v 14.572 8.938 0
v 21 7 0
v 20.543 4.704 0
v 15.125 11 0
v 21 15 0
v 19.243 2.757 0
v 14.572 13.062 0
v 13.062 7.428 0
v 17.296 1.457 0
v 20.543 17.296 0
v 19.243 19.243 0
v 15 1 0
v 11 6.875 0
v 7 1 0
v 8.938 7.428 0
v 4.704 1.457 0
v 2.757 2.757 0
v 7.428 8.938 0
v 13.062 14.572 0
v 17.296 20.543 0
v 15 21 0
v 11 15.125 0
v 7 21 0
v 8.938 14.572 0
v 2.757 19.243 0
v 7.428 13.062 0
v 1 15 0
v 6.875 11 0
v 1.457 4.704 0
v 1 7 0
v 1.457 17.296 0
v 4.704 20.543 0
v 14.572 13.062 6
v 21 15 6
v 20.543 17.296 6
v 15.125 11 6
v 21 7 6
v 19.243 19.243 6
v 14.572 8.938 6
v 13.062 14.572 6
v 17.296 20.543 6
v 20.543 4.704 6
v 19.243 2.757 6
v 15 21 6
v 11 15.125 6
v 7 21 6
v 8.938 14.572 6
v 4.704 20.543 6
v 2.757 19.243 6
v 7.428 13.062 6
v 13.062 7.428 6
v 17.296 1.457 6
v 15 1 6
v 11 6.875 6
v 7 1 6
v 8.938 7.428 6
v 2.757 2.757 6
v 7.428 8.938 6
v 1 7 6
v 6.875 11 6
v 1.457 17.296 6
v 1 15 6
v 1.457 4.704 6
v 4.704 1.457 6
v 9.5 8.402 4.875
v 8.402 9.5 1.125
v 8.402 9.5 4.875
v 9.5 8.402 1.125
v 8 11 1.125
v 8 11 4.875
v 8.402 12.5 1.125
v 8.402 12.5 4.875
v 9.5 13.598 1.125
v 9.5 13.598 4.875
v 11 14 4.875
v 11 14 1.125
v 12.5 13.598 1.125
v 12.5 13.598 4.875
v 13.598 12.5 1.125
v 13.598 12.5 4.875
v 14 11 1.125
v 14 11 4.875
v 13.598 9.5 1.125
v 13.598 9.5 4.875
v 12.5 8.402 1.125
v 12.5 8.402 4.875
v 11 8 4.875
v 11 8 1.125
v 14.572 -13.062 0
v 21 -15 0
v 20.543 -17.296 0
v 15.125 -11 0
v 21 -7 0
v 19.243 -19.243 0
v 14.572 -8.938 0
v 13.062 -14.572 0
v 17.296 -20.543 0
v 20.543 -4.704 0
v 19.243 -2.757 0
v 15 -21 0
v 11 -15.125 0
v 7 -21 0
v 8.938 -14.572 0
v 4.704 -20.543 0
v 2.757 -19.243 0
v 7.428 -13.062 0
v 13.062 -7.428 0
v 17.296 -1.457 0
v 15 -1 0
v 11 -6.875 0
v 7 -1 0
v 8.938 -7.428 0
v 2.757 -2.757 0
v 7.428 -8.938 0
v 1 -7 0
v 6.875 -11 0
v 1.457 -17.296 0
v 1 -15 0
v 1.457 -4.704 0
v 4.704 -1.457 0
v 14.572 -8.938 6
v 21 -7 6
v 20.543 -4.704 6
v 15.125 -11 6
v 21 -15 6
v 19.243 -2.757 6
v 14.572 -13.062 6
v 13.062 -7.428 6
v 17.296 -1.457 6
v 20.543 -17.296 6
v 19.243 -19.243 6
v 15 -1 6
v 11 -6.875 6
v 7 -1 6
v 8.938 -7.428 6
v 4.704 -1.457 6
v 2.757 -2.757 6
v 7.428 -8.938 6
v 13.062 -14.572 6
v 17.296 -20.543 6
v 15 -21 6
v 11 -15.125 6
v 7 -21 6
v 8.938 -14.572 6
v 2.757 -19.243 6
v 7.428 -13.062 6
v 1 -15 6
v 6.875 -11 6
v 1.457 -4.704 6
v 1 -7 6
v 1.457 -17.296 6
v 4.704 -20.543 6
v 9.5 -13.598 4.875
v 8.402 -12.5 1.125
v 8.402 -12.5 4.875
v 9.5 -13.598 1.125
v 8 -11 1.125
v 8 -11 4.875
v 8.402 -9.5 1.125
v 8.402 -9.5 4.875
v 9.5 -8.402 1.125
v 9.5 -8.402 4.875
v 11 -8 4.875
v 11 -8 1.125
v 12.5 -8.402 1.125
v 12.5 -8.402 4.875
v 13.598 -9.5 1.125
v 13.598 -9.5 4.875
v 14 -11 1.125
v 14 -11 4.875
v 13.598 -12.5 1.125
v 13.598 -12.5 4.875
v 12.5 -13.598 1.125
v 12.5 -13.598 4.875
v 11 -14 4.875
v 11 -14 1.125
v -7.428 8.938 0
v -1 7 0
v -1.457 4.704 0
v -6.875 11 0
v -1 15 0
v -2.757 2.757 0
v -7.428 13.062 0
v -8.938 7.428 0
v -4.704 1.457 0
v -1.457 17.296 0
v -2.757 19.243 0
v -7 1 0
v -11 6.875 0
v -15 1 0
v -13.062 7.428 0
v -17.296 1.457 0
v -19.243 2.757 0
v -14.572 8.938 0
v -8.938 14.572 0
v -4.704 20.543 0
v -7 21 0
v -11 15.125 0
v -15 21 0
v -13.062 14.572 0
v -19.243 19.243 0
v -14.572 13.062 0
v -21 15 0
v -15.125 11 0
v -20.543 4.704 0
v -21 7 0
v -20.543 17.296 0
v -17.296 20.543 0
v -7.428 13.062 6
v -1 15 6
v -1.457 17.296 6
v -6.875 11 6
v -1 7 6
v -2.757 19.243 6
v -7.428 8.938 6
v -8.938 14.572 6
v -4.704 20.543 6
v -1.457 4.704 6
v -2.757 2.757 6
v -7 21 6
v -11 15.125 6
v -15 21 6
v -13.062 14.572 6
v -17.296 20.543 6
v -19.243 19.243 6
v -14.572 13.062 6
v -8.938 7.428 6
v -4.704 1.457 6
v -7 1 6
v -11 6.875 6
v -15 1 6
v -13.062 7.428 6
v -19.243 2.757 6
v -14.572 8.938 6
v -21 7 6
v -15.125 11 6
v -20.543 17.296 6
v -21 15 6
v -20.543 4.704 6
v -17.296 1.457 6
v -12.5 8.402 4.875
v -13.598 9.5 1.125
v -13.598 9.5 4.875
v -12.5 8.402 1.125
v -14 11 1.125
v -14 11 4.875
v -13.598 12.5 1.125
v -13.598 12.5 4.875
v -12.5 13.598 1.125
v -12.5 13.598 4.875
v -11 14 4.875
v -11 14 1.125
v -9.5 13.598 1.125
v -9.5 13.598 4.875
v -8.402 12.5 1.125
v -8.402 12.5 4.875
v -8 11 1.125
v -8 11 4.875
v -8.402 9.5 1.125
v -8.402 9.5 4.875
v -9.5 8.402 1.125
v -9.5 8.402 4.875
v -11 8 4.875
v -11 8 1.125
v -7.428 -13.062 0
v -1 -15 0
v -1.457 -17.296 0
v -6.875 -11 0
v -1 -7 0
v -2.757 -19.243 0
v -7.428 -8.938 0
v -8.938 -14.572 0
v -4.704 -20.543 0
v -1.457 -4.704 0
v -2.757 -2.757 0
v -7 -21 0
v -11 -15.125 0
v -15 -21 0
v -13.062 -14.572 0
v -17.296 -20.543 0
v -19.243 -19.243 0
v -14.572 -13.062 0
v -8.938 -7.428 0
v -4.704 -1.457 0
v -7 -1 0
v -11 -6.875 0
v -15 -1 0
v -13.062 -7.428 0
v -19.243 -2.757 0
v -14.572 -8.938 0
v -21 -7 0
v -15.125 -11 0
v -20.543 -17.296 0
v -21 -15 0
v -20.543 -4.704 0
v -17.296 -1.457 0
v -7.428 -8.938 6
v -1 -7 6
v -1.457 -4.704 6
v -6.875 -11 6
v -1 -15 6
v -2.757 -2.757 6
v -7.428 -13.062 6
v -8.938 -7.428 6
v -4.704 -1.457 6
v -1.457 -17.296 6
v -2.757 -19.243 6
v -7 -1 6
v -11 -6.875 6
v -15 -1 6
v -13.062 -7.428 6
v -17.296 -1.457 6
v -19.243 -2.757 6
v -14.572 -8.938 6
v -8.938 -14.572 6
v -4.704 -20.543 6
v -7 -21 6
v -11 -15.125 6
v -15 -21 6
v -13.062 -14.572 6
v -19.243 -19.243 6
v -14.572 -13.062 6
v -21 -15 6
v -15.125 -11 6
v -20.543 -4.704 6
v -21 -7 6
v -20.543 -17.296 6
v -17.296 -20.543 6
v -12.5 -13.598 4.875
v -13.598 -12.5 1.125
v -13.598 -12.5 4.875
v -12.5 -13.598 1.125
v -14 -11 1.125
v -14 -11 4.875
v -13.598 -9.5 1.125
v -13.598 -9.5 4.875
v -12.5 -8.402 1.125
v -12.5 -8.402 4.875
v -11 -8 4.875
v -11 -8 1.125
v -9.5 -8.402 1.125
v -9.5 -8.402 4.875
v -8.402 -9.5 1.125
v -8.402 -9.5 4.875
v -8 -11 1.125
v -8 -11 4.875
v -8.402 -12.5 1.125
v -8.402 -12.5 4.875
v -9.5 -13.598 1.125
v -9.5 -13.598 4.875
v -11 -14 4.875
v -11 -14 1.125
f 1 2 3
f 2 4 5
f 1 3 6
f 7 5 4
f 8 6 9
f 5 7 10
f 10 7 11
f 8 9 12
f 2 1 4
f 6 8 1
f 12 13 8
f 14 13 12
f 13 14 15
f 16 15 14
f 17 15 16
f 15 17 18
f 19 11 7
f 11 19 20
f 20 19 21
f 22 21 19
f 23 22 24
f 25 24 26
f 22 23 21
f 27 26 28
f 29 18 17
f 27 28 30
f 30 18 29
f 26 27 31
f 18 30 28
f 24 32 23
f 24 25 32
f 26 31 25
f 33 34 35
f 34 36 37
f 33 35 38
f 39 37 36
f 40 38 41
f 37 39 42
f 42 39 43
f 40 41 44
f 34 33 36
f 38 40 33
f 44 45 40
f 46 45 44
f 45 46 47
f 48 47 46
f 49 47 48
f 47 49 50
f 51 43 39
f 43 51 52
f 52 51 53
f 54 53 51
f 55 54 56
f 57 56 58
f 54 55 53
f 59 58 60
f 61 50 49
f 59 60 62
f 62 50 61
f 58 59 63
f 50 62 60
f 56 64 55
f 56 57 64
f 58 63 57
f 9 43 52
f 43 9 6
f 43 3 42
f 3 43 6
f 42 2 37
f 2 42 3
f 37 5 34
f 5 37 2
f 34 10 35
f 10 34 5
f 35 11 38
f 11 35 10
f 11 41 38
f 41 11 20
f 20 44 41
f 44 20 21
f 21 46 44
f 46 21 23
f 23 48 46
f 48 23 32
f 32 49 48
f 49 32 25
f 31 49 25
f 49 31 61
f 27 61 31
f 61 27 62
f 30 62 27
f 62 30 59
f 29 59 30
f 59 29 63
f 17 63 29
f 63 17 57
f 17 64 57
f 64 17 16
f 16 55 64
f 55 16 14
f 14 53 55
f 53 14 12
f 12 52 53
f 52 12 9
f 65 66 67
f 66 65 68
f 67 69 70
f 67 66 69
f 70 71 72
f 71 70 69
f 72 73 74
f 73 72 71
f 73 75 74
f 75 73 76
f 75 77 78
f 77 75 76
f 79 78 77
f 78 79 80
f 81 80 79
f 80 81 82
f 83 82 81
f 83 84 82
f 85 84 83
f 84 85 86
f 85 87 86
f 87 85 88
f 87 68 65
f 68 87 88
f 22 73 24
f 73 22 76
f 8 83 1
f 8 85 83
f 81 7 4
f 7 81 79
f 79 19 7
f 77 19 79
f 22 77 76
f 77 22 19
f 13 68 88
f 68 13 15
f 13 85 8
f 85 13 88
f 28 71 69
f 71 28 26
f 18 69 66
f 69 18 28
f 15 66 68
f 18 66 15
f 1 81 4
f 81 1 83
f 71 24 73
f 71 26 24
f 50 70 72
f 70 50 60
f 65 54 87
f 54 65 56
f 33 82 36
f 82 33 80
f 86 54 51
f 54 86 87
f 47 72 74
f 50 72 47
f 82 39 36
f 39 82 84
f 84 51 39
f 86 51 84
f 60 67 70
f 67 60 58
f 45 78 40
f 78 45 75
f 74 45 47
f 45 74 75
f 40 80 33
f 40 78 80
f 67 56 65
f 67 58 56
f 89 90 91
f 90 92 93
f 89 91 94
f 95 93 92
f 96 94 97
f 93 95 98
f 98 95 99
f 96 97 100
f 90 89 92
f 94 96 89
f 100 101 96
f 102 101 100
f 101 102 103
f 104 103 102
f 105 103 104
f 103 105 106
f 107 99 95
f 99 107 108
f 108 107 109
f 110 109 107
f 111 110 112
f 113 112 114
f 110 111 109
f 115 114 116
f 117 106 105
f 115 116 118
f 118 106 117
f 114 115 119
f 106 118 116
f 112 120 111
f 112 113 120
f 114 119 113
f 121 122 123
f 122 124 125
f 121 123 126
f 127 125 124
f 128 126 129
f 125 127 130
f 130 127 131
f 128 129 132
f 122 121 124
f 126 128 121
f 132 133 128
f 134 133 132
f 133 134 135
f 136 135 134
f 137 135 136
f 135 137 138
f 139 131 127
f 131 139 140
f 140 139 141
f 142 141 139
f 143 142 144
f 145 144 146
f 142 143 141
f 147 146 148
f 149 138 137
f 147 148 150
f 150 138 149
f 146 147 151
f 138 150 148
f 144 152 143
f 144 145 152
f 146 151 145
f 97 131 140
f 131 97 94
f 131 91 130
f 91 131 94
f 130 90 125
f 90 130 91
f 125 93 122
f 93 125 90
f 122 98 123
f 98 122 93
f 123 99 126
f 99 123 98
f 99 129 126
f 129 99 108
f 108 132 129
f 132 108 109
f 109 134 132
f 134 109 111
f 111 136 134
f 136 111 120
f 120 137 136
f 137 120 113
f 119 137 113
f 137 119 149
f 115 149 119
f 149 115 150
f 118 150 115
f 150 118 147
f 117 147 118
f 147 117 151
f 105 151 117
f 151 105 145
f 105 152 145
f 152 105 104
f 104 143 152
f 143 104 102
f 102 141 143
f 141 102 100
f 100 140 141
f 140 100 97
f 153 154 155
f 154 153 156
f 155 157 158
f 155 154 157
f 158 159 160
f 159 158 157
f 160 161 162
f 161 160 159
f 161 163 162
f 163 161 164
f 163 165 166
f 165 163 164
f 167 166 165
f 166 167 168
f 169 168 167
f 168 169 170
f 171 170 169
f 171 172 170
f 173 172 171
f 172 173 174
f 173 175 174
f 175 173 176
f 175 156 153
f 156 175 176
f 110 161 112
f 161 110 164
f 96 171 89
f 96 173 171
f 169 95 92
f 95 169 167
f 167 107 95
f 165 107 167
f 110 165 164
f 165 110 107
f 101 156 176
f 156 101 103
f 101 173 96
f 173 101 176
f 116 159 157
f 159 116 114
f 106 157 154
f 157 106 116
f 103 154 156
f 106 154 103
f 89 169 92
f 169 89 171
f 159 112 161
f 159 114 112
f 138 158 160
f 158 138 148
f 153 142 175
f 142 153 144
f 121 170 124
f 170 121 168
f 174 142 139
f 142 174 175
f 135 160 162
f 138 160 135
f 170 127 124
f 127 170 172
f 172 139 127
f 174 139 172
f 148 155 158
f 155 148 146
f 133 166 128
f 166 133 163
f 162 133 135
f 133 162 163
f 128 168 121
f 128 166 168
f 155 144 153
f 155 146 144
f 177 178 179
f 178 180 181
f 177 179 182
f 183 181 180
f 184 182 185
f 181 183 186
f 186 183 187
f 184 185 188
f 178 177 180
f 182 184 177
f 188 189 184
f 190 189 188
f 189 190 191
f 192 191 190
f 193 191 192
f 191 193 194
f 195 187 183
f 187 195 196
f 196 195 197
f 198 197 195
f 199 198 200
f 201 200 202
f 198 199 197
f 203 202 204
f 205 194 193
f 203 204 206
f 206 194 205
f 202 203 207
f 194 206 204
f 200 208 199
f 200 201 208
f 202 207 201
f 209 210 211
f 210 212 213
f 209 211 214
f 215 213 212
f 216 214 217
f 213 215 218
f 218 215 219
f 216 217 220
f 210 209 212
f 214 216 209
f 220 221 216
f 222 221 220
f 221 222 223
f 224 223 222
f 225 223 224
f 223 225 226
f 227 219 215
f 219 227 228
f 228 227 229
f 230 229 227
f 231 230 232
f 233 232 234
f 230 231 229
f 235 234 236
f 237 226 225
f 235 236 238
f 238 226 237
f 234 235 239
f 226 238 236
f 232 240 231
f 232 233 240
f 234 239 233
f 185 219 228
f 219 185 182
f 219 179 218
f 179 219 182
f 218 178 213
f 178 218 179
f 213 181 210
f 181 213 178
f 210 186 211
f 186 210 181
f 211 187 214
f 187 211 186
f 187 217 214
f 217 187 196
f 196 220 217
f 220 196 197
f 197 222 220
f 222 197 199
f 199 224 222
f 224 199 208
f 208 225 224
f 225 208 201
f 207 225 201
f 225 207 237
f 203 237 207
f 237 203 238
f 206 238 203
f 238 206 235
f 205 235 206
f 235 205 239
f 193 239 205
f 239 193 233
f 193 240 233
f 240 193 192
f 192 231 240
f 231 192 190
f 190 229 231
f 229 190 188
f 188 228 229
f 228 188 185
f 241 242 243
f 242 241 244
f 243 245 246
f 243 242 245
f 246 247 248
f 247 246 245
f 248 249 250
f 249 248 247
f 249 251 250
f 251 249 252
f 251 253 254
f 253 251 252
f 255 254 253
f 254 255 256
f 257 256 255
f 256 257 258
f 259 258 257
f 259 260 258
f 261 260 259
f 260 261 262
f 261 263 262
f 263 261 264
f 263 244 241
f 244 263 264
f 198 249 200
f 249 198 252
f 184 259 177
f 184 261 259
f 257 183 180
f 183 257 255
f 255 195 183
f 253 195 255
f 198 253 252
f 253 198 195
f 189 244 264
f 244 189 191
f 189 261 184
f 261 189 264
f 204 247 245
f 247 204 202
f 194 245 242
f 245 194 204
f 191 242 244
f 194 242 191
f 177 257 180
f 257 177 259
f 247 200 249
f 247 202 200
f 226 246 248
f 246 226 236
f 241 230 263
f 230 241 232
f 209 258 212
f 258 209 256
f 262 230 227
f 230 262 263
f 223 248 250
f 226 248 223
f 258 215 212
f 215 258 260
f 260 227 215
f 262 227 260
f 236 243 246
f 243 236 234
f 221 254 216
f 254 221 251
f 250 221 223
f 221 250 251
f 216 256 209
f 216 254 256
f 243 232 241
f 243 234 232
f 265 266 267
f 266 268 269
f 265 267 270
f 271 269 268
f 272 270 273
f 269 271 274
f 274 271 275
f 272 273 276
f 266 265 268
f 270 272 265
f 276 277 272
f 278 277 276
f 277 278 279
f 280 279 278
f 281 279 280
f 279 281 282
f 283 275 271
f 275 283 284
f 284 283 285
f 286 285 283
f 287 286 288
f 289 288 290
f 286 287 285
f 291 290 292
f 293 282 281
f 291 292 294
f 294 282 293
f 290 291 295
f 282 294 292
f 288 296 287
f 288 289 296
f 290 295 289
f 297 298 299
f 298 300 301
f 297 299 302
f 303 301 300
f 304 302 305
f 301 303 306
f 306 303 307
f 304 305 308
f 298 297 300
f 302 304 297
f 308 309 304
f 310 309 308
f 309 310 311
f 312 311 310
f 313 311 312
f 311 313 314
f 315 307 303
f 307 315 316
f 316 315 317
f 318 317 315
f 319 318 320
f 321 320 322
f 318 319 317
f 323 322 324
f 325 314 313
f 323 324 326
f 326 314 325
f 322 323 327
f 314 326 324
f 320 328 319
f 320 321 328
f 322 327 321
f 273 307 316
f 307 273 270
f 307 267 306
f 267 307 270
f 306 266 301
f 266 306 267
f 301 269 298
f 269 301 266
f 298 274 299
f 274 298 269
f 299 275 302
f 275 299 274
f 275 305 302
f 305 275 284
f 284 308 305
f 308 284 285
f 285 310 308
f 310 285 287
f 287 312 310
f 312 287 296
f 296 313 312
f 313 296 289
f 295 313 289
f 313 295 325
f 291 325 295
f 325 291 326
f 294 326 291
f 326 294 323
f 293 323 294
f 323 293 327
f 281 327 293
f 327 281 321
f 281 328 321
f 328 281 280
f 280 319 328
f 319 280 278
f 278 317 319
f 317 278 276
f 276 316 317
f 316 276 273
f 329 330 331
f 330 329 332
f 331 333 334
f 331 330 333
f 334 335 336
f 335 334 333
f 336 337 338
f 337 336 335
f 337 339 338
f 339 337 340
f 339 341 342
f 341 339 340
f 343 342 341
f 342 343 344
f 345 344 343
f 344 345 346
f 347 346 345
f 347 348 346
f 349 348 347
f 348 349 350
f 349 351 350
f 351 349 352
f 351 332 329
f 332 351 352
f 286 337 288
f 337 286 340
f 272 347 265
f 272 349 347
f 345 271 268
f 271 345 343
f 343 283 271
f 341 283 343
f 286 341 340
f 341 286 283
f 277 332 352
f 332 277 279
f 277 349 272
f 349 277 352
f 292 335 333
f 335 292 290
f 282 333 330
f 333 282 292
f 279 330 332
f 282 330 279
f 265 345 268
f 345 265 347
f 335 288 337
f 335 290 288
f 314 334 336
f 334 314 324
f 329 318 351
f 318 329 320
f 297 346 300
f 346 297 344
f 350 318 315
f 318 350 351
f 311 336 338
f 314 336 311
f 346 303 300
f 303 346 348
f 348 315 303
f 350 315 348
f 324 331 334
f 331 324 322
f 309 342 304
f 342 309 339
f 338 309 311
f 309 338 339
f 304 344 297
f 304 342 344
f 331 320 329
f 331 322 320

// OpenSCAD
// file: configuration.scad
// default configuration
// m6 rods and nema14 motors

rod_size = 6;
rod_nut_size = 12; //12 for M6, 16 for M8
bearing_size = 12.5; //12 for LM6UU, 15 for LM8UU,LM8SUU
bearing_length = 20; //19 for LM6UU, 17 for LM8SUU, 24 for LM8UU
yz_motor_distance = 25;
motor_screw_spacing = 26; //26 for NEMA14, 31 for NEMA17
motor_casing = 38; //38 for NEMA14, 45 for NEMA17
end_height = 40;
bed_mount_height = 16;
//x_rod_spacing = motor_screw_spacing + 3 + rod_size;
x_rod_spacing = 30;
x_carriage_width = 70;
carriage_extruder_offset = 5;
pulley_size = 20;
idler_pulley_width = 10;
gusset_size = 15;
// main file
// foot

include <configuration.scad>

module foot() difference() {
	linear_extrude(height = rod_size, convexity = 5) difference() {
		minkowski() {
			square(rod_size + 2, center = true);
			circle(rod_size, $fn = 16);
		}
		circle(rod_size / 2, $fn = 12);
	}
	translate([0, 0, -rod_size / 16]) cylinder(r1 = rod_size * 3/4, r2 = rod_size / 4, h = rod_size / 2, $fn = 12);
	translate([0, 0, rod_size / 2 + rod_size / 16]) cylinder(r2 = rod_size * 3/4, r1 = rod_size / 4, h = rod_size / 2, $fn = 12);
}

for(x = [1, -1]) for(y = [1, -1]) translate([x * (rod_size * 1.5 + 2), y * (rod_size * 1.5 + 2), 0]) foot();
